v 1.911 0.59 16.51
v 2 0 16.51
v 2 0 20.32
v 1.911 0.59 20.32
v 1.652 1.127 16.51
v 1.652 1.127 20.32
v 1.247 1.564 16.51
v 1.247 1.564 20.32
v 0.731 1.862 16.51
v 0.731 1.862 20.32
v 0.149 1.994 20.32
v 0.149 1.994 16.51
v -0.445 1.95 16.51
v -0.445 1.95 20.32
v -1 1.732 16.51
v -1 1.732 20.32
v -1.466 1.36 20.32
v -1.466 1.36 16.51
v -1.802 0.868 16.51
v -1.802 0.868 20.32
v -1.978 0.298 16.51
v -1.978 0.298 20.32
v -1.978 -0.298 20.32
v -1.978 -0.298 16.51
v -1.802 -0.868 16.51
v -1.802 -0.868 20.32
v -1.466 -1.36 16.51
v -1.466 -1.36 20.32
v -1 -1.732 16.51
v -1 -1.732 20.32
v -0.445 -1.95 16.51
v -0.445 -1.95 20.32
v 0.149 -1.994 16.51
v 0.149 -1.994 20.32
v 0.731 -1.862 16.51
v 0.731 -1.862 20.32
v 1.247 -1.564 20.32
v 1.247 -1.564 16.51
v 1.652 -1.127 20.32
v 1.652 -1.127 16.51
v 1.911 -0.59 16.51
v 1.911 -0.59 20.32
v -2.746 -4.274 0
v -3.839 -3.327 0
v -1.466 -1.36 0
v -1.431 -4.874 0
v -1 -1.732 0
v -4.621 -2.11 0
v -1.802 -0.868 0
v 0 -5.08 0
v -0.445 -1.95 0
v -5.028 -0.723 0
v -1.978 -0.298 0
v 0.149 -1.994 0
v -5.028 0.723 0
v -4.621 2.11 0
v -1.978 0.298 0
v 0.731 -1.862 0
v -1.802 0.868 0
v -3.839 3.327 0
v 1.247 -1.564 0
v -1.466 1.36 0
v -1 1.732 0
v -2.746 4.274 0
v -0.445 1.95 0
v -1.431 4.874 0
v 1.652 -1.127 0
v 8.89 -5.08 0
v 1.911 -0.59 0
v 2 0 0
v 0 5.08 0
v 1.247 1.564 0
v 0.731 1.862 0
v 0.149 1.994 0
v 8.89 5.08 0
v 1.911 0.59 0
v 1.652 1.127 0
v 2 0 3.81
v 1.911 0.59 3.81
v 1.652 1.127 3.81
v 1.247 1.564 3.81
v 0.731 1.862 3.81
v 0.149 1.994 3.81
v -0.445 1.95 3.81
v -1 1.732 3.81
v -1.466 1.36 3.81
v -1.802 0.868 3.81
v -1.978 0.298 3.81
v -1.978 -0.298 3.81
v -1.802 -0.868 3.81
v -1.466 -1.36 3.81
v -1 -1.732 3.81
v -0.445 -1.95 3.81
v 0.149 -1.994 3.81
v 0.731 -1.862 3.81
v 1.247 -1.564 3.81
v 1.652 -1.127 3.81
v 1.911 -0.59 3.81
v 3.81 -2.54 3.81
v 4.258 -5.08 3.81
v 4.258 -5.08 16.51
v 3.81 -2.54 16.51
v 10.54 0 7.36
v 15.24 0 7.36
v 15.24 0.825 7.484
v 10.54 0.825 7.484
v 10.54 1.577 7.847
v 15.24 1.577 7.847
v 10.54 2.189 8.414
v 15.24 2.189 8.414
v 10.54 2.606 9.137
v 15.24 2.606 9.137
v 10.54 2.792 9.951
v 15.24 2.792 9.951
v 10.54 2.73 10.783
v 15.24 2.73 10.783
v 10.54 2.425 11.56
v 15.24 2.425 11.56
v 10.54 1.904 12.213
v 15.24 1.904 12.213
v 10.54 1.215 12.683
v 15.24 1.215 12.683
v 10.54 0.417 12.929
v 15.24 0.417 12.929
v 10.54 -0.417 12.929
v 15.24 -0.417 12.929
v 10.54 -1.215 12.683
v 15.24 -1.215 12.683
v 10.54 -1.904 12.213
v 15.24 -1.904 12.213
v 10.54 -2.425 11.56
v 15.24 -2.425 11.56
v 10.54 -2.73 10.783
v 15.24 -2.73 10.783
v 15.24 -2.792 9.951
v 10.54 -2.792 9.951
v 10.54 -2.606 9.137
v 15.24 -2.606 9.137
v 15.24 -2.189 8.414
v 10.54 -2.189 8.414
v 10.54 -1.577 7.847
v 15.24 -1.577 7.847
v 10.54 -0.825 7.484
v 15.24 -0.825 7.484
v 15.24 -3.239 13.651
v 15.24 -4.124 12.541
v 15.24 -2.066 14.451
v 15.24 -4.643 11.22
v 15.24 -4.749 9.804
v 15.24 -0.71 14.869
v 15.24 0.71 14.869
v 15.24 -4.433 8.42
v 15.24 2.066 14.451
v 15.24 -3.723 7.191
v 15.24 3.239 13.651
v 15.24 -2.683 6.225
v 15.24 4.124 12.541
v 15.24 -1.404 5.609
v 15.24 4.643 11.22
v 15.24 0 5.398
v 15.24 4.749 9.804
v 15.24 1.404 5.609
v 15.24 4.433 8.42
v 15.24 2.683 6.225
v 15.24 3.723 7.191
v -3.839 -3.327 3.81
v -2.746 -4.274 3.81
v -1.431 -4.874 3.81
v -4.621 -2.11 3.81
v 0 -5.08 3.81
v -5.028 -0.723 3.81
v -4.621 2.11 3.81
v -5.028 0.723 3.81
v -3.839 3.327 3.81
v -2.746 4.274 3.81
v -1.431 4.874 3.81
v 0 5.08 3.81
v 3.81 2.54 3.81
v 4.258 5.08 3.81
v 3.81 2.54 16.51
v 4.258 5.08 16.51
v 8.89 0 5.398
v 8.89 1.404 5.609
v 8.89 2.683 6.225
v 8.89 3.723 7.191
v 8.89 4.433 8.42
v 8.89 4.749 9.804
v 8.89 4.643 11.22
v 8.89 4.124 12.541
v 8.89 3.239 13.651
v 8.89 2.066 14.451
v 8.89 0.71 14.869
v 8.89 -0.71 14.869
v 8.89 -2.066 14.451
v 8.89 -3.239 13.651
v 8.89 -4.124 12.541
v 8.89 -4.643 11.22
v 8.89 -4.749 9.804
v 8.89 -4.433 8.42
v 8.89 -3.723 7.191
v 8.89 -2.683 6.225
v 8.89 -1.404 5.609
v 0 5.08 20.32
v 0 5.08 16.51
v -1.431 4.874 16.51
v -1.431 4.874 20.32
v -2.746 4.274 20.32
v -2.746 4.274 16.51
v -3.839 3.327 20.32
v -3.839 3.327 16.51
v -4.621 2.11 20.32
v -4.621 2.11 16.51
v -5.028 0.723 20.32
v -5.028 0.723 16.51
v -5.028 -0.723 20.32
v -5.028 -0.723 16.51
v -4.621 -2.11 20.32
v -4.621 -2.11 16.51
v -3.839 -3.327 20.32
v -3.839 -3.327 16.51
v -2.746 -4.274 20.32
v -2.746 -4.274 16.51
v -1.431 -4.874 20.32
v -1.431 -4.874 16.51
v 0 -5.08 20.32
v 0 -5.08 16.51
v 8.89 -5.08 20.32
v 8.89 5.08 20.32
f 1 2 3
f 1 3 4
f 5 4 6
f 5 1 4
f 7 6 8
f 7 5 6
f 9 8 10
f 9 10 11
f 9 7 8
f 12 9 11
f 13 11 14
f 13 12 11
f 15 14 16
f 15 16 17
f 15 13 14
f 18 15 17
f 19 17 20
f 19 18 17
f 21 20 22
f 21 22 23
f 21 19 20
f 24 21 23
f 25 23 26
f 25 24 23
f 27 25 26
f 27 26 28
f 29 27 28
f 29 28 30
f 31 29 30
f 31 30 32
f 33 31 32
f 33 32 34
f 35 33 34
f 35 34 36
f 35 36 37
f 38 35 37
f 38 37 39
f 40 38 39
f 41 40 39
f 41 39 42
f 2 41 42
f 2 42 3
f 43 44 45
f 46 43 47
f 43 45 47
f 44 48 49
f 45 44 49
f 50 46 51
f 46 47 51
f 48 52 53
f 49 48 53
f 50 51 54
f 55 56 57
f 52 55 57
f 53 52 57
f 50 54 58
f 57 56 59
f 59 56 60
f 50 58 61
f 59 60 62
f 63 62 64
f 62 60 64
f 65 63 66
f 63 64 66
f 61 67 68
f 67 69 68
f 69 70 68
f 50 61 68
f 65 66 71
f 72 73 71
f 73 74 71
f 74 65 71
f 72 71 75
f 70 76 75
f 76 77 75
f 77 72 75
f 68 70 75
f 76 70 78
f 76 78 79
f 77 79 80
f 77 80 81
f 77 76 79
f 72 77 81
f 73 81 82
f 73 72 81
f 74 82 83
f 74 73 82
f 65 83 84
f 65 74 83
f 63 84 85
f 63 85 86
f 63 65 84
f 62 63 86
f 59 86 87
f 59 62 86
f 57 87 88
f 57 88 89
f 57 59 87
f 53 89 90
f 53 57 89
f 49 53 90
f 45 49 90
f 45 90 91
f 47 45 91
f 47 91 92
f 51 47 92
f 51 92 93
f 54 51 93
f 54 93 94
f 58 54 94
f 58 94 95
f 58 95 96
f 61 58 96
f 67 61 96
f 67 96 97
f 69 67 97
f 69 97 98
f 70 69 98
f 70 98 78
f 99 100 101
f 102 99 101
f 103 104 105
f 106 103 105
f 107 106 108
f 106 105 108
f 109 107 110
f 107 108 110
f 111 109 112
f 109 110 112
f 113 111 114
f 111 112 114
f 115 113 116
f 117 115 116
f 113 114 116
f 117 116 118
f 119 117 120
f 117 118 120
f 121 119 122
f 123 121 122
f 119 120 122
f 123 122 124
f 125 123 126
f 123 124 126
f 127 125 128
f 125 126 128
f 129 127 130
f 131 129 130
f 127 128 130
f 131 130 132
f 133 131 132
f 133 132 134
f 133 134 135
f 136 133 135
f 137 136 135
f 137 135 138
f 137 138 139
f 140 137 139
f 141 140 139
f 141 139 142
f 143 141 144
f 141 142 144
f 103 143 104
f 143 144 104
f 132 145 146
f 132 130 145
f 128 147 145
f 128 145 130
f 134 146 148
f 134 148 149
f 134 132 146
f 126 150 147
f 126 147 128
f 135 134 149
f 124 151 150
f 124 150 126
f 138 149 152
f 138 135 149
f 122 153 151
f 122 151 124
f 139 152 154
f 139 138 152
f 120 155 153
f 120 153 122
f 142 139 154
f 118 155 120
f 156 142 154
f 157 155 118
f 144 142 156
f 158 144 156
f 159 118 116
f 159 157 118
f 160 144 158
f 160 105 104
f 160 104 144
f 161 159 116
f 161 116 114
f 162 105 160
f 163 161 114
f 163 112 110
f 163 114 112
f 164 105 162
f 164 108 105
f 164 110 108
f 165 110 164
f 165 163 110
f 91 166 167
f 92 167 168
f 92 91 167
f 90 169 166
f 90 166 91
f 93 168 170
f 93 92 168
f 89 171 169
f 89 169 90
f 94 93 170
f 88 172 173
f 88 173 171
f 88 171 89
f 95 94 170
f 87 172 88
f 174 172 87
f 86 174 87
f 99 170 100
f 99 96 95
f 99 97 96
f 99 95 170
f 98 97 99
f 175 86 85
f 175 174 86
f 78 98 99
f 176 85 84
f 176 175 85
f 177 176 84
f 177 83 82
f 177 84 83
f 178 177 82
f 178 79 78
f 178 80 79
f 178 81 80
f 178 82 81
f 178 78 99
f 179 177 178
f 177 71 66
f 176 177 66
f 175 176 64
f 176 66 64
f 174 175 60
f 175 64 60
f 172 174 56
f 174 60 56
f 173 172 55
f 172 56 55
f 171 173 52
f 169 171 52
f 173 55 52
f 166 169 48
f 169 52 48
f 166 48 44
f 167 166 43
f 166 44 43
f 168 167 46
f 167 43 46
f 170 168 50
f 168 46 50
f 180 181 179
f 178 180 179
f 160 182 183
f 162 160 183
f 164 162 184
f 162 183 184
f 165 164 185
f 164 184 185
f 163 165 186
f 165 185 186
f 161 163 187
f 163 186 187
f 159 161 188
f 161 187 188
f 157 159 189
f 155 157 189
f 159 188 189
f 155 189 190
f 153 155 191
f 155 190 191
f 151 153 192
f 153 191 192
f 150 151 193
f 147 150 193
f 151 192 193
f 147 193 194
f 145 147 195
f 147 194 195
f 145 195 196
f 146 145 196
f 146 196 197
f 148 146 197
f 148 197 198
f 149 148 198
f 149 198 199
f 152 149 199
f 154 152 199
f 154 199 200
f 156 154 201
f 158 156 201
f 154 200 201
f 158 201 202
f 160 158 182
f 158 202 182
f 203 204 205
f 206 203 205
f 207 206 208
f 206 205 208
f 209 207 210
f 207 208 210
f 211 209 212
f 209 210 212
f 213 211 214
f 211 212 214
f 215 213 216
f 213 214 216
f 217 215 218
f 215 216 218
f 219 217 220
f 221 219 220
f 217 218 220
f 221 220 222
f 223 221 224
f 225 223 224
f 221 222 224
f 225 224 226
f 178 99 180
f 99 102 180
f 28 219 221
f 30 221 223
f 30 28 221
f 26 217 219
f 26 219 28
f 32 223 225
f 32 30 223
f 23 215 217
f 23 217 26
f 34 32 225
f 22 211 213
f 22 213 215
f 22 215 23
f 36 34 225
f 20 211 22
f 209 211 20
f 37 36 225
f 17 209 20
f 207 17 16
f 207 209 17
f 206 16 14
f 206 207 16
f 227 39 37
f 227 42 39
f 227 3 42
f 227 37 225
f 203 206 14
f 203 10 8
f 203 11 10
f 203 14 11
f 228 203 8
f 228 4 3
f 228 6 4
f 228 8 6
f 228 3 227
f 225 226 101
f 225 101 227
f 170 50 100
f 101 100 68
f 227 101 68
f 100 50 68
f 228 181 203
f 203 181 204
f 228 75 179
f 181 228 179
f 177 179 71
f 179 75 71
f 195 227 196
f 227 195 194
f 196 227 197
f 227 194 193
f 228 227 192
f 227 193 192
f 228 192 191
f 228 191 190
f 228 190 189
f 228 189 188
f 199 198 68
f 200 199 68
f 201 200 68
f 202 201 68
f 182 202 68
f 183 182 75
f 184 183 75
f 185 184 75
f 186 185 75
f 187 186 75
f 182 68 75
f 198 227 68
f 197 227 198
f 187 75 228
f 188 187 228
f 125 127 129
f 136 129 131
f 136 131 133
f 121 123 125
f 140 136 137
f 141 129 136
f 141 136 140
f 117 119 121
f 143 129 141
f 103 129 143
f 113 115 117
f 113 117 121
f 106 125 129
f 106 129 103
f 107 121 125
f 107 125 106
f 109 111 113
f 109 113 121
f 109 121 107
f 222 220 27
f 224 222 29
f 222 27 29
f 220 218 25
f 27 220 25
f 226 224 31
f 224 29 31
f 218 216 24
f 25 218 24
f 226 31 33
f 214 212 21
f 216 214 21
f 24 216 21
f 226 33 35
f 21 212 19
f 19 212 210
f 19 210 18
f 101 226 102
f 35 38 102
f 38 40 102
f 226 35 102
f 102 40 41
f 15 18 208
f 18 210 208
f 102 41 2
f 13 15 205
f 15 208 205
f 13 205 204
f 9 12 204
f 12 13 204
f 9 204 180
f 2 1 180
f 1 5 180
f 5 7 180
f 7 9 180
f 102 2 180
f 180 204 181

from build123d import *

# Parameters (mm, degrees)
SKETCH2_R           = 2
BOSS_EXTRUDE1_DEPTH = 20.32
SKETCH3_R           = 2
CUT_EXTRUDE1_DEPTH  = 6.35
SKETCH4_R           = 4.7625
BOSS_EXTRUDE2_DEPTH = 6.35
SKETCH5_R           = 2.8
CUT_EXTRUDE2_DEPTH  = 4.7
CHAMFER2_SIZE       = 2.54
CHAMFER2_SIZE2      = 0.447870531


with BuildPart() as part:
    # Sketch2 → Boss-Extrude1 (new body)
    with BuildSketch(Plane.XY):
        with BuildLine():
            ThreePointArc((0, 5.08), (-5.08, 0), (0, -5.08))
            Line((0, -5.08), (8.89, -5.08))
            Line((8.89, -5.08), (8.89, 5.08))
            Line((8.89, 5.08), (0, 5.08))
        make_face()
        Circle(SKETCH2_R, mode=Mode.SUBTRACT)
    extrude(amount=BOSS_EXTRUDE1_DEPTH)

    # Sketch3 → Cut-Extrude1 (cut, symmetric)
    with BuildSketch(Plane.XY.offset(10.16)):
        with BuildLine():
            ThreePointArc((0, 5.08), (-5.08, 0), (0, -5.08))
            ThreePointArc((0, -5.08), (2.090104165, -4.630104165), (3.81, -3.360104165))
            Line((3.81, -3.360104165), (3.81, 3.360104165))
            ThreePointArc((3.81, 3.360104165), (2.090104165, 4.630104165), (0, 5.08))
        make_face()
        Circle(SKETCH3_R, mode=Mode.SUBTRACT)
        with BuildLine():
            Line((3.81, 5.08), (0, 5.08))
            ThreePointArc((0, 5.08), (2.090104165, 4.630104165), (3.81, 3.360104165))
            Line((3.81, 3.360104165), (3.81, 5.08))
        make_face()
        with BuildLine():
            Line((0, -5.08), (3.81, -5.08))
            Line((3.81, -5.08), (3.81, -3.360104165))
            ThreePointArc((3.81, -3.360104165), (2.090104165, -4.630104165), (0, -5.08))
        make_face()
    extrude(amount=CUT_EXTRUDE1_DEPTH, both=True, mode=Mode.SUBTRACT)

    # Sketch4 → Boss-Extrude2 (add)
    with BuildSketch(Plane(origin=(8.89, 0, 0), x_dir=(0, 0, -1), z_dir=(1, 0, 0))):
        with Locations((-10.16, 0)):
            Circle(SKETCH4_R)
    extrude(amount=BOSS_EXTRUDE2_DEPTH)

    # Sketch5 → Cut-Extrude2 (cut)
    with BuildSketch(Plane(origin=(15.24, 0, 0), x_dir=(0, 0, -1), z_dir=(1, 0, 0))):
        with Locations((-10.16, 0)):
            Circle(SKETCH5_R)
    extrude(amount=-CUT_EXTRUDE2_DEPTH, mode=Mode.SUBTRACT)

    # Chamfer2
    chamfer2_edges = [part.edges().sort_by_distance(p)[0] for p in [
        (3.81, 5.08, 10.16),
        (3.81, -5.08, 10.16),
    ]]
    chamfer2_side = [part.faces().sort_by_distance(p)[0] for p in [
        (3.81, 0, 10.16),
    ]]
    chamfer(chamfer2_edges, length=CHAMFER2_SIZE, length2=CHAMFER2_SIZE2, reference=chamfer2_side[0])


solid = part.part
